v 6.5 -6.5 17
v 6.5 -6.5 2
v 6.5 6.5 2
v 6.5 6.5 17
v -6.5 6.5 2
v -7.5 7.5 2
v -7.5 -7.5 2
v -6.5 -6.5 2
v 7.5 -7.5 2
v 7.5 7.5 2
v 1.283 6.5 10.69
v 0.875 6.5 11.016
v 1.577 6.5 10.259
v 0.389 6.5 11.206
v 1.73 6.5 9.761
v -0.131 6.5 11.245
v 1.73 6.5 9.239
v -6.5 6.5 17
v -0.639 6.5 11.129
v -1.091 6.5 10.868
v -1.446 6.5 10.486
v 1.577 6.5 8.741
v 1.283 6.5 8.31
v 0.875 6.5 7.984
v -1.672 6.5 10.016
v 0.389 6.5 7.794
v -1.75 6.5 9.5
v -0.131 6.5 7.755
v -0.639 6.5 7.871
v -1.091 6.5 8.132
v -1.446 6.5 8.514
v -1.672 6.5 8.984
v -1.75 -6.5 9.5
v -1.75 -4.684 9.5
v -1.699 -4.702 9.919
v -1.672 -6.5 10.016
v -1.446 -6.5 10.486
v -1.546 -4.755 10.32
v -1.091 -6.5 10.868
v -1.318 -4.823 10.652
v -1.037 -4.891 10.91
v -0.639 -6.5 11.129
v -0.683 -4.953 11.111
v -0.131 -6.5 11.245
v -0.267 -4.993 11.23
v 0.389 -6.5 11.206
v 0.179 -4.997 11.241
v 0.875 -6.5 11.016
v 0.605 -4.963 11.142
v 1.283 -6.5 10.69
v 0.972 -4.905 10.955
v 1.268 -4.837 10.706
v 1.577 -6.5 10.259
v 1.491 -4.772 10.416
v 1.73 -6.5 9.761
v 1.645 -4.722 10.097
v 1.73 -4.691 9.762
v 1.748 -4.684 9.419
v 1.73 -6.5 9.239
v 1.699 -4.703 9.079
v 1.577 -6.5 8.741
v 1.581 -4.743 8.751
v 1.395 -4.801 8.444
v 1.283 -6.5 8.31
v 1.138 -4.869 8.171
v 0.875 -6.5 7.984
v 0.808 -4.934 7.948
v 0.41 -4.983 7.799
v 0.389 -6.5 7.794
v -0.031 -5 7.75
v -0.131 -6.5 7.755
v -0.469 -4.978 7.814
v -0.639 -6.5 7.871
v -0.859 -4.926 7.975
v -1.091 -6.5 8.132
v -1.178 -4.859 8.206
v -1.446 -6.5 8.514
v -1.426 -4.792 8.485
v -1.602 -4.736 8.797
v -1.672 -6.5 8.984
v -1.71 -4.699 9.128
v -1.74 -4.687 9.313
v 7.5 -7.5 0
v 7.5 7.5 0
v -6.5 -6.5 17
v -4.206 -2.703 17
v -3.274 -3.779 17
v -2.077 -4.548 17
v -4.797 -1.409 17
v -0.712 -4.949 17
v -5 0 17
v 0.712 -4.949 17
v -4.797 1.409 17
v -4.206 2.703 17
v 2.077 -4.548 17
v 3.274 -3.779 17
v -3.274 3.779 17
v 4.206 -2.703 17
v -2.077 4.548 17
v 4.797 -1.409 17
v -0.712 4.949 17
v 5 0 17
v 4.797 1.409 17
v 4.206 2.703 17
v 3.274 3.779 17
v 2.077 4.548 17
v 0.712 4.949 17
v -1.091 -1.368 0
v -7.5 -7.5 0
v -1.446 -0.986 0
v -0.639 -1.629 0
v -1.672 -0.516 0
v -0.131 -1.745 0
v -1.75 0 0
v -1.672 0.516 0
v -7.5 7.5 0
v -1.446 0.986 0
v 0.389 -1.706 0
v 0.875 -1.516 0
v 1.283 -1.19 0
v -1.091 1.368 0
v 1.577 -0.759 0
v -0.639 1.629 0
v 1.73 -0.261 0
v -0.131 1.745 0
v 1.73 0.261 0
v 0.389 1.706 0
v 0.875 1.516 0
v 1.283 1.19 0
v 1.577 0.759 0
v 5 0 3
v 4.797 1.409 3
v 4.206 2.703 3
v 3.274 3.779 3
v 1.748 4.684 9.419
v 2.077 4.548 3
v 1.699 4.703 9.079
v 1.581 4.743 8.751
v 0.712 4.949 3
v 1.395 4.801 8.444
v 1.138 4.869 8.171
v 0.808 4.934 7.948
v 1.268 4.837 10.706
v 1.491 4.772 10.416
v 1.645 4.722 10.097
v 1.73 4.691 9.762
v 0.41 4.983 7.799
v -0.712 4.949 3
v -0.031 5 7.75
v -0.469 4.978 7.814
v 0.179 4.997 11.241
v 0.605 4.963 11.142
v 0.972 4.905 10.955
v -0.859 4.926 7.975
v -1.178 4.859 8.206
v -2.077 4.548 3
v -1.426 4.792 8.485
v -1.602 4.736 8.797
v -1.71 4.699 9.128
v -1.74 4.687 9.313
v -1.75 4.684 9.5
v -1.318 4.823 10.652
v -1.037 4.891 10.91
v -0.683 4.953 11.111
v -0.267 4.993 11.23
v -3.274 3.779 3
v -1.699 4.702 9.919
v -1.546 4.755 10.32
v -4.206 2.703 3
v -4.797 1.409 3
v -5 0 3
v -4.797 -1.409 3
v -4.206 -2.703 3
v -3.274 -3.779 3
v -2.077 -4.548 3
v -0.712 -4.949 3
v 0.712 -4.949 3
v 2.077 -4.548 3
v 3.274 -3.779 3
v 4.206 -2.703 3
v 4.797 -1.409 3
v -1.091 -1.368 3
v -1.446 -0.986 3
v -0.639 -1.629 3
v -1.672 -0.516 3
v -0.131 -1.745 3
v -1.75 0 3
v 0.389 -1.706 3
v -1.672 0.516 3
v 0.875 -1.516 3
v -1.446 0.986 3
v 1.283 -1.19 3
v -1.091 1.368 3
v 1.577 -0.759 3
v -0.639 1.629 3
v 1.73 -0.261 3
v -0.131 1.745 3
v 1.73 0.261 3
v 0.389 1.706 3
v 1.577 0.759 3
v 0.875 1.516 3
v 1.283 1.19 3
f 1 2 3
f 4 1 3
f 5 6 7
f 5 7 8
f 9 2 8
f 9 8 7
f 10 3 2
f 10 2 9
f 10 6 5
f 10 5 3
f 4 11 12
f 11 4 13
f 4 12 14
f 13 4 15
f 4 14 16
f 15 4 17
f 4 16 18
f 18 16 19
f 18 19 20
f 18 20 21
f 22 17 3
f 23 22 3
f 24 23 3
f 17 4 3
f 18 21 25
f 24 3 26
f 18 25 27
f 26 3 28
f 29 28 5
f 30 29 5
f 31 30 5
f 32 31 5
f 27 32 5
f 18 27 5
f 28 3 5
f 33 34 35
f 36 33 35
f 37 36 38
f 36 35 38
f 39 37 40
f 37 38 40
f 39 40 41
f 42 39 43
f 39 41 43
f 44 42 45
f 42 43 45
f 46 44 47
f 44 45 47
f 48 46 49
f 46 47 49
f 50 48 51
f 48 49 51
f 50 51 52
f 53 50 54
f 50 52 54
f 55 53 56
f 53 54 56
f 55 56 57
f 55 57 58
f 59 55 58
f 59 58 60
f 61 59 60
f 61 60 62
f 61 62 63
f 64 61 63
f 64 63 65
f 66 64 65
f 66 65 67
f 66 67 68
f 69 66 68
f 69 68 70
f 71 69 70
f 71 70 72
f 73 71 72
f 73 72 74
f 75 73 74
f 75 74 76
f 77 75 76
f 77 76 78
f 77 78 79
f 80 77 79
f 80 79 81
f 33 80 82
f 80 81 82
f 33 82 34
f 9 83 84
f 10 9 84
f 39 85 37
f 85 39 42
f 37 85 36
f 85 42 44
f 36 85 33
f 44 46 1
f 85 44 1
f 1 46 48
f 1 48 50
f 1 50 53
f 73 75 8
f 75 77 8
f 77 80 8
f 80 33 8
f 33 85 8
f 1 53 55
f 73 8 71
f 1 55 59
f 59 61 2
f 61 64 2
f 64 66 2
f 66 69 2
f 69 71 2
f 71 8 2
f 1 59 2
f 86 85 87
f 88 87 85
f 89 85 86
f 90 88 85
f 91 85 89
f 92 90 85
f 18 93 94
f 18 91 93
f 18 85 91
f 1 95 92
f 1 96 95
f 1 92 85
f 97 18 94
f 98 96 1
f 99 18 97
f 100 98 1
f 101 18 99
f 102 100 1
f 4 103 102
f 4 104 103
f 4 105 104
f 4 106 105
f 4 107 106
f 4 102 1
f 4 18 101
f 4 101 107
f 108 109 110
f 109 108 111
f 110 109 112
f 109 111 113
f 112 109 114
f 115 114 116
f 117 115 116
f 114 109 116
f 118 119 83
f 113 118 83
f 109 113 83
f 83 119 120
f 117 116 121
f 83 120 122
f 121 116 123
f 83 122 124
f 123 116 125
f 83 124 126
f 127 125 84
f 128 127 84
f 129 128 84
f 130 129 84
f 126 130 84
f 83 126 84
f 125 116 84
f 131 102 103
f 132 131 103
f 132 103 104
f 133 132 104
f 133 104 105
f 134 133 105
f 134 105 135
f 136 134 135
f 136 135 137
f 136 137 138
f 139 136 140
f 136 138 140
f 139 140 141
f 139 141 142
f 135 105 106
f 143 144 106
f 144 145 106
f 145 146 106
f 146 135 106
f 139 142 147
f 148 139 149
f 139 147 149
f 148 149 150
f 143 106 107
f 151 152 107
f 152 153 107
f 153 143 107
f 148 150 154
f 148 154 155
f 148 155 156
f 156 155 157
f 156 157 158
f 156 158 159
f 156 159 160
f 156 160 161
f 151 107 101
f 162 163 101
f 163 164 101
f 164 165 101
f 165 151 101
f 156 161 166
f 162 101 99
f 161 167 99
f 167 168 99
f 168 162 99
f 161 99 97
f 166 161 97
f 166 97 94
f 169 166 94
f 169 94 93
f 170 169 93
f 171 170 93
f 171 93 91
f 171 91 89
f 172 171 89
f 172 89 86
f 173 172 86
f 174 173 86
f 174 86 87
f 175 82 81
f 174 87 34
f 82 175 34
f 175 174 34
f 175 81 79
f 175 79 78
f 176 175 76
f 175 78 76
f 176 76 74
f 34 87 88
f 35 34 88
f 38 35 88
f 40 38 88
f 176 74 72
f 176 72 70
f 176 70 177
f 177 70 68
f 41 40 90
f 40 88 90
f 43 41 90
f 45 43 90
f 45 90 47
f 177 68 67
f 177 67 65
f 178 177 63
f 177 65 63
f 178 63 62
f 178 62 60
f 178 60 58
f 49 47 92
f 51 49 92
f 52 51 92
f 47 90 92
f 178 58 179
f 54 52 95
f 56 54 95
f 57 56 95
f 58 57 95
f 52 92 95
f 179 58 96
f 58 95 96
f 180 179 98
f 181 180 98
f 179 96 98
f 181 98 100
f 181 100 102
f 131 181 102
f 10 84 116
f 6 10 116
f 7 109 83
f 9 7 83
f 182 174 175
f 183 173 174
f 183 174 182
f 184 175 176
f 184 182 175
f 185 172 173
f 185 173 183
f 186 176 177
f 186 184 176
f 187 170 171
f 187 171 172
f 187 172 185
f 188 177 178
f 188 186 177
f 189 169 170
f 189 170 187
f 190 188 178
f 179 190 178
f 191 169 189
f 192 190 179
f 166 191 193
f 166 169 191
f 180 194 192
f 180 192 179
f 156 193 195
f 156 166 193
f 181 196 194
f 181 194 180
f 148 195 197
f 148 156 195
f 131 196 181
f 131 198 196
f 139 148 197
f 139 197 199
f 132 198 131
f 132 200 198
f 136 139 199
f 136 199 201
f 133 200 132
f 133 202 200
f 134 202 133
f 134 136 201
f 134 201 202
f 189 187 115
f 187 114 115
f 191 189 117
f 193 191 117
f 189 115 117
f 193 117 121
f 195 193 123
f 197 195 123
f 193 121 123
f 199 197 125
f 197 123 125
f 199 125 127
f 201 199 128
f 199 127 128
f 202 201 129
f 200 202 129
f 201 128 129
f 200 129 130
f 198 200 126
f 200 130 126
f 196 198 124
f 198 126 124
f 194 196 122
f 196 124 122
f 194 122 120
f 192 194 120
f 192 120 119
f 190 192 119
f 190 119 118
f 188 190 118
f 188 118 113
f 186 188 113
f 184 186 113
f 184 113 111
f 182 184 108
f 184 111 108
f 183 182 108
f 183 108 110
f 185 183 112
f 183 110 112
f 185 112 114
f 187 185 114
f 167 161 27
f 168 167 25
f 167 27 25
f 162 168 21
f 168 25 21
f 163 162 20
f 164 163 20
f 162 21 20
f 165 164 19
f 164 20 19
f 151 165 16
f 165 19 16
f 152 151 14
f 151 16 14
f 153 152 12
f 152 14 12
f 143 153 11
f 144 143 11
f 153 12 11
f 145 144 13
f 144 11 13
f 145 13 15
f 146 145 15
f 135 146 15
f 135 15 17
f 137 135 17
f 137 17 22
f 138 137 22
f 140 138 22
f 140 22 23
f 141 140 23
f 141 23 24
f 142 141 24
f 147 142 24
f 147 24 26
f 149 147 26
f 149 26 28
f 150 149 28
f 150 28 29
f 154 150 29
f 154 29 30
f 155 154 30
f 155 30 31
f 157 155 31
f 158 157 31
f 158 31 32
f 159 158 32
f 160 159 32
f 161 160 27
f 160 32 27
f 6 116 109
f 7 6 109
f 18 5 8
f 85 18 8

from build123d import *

# Parameters (mm, degrees)
F1_DEPTH       = 2
F3_DEPTH       = 15
F5_D           = 3.5
F5_CBORE_D     = 10
F5_CBORE_DEPTH = 14
F7_D           = 3.5


with BuildPart() as f1:
    # F0 (on Top) → F1 (new body)
    with BuildSketch(Plane.XY):
        Polygon((7.5, -7.5), (-7.5, 7.5), (-7.5, -7.5), align=None)
        Polygon((7.5, 7.5), (-7.5, 7.5), (7.5, -7.5), align=None)
    extrude(amount=F1_DEPTH)

    # F2 (on face) → F3 (join)
    with BuildSketch(Plane.XY.offset(2)):
        Polygon((6.5, -6.5), (-6.5, 6.5), (-6.5, -6.5), align=None)
        Polygon((6.5, 6.5), (-6.5, 6.5), (6.5, -6.5), align=None)
    extrude(amount=F3_DEPTH)

    # F5 (through all)
    with Locations(Plane.XY.offset(17)):
        with Locations((0, 0)):
            CounterBoreHole(F5_D / 2, F5_CBORE_D / 2, F5_CBORE_DEPTH)

    # F7 (through all)
    with Locations(Plane.XZ.offset(6.5)):
        with Locations((0, 9.5)):
            Hole(F7_D / 2)


solid = f1.part
